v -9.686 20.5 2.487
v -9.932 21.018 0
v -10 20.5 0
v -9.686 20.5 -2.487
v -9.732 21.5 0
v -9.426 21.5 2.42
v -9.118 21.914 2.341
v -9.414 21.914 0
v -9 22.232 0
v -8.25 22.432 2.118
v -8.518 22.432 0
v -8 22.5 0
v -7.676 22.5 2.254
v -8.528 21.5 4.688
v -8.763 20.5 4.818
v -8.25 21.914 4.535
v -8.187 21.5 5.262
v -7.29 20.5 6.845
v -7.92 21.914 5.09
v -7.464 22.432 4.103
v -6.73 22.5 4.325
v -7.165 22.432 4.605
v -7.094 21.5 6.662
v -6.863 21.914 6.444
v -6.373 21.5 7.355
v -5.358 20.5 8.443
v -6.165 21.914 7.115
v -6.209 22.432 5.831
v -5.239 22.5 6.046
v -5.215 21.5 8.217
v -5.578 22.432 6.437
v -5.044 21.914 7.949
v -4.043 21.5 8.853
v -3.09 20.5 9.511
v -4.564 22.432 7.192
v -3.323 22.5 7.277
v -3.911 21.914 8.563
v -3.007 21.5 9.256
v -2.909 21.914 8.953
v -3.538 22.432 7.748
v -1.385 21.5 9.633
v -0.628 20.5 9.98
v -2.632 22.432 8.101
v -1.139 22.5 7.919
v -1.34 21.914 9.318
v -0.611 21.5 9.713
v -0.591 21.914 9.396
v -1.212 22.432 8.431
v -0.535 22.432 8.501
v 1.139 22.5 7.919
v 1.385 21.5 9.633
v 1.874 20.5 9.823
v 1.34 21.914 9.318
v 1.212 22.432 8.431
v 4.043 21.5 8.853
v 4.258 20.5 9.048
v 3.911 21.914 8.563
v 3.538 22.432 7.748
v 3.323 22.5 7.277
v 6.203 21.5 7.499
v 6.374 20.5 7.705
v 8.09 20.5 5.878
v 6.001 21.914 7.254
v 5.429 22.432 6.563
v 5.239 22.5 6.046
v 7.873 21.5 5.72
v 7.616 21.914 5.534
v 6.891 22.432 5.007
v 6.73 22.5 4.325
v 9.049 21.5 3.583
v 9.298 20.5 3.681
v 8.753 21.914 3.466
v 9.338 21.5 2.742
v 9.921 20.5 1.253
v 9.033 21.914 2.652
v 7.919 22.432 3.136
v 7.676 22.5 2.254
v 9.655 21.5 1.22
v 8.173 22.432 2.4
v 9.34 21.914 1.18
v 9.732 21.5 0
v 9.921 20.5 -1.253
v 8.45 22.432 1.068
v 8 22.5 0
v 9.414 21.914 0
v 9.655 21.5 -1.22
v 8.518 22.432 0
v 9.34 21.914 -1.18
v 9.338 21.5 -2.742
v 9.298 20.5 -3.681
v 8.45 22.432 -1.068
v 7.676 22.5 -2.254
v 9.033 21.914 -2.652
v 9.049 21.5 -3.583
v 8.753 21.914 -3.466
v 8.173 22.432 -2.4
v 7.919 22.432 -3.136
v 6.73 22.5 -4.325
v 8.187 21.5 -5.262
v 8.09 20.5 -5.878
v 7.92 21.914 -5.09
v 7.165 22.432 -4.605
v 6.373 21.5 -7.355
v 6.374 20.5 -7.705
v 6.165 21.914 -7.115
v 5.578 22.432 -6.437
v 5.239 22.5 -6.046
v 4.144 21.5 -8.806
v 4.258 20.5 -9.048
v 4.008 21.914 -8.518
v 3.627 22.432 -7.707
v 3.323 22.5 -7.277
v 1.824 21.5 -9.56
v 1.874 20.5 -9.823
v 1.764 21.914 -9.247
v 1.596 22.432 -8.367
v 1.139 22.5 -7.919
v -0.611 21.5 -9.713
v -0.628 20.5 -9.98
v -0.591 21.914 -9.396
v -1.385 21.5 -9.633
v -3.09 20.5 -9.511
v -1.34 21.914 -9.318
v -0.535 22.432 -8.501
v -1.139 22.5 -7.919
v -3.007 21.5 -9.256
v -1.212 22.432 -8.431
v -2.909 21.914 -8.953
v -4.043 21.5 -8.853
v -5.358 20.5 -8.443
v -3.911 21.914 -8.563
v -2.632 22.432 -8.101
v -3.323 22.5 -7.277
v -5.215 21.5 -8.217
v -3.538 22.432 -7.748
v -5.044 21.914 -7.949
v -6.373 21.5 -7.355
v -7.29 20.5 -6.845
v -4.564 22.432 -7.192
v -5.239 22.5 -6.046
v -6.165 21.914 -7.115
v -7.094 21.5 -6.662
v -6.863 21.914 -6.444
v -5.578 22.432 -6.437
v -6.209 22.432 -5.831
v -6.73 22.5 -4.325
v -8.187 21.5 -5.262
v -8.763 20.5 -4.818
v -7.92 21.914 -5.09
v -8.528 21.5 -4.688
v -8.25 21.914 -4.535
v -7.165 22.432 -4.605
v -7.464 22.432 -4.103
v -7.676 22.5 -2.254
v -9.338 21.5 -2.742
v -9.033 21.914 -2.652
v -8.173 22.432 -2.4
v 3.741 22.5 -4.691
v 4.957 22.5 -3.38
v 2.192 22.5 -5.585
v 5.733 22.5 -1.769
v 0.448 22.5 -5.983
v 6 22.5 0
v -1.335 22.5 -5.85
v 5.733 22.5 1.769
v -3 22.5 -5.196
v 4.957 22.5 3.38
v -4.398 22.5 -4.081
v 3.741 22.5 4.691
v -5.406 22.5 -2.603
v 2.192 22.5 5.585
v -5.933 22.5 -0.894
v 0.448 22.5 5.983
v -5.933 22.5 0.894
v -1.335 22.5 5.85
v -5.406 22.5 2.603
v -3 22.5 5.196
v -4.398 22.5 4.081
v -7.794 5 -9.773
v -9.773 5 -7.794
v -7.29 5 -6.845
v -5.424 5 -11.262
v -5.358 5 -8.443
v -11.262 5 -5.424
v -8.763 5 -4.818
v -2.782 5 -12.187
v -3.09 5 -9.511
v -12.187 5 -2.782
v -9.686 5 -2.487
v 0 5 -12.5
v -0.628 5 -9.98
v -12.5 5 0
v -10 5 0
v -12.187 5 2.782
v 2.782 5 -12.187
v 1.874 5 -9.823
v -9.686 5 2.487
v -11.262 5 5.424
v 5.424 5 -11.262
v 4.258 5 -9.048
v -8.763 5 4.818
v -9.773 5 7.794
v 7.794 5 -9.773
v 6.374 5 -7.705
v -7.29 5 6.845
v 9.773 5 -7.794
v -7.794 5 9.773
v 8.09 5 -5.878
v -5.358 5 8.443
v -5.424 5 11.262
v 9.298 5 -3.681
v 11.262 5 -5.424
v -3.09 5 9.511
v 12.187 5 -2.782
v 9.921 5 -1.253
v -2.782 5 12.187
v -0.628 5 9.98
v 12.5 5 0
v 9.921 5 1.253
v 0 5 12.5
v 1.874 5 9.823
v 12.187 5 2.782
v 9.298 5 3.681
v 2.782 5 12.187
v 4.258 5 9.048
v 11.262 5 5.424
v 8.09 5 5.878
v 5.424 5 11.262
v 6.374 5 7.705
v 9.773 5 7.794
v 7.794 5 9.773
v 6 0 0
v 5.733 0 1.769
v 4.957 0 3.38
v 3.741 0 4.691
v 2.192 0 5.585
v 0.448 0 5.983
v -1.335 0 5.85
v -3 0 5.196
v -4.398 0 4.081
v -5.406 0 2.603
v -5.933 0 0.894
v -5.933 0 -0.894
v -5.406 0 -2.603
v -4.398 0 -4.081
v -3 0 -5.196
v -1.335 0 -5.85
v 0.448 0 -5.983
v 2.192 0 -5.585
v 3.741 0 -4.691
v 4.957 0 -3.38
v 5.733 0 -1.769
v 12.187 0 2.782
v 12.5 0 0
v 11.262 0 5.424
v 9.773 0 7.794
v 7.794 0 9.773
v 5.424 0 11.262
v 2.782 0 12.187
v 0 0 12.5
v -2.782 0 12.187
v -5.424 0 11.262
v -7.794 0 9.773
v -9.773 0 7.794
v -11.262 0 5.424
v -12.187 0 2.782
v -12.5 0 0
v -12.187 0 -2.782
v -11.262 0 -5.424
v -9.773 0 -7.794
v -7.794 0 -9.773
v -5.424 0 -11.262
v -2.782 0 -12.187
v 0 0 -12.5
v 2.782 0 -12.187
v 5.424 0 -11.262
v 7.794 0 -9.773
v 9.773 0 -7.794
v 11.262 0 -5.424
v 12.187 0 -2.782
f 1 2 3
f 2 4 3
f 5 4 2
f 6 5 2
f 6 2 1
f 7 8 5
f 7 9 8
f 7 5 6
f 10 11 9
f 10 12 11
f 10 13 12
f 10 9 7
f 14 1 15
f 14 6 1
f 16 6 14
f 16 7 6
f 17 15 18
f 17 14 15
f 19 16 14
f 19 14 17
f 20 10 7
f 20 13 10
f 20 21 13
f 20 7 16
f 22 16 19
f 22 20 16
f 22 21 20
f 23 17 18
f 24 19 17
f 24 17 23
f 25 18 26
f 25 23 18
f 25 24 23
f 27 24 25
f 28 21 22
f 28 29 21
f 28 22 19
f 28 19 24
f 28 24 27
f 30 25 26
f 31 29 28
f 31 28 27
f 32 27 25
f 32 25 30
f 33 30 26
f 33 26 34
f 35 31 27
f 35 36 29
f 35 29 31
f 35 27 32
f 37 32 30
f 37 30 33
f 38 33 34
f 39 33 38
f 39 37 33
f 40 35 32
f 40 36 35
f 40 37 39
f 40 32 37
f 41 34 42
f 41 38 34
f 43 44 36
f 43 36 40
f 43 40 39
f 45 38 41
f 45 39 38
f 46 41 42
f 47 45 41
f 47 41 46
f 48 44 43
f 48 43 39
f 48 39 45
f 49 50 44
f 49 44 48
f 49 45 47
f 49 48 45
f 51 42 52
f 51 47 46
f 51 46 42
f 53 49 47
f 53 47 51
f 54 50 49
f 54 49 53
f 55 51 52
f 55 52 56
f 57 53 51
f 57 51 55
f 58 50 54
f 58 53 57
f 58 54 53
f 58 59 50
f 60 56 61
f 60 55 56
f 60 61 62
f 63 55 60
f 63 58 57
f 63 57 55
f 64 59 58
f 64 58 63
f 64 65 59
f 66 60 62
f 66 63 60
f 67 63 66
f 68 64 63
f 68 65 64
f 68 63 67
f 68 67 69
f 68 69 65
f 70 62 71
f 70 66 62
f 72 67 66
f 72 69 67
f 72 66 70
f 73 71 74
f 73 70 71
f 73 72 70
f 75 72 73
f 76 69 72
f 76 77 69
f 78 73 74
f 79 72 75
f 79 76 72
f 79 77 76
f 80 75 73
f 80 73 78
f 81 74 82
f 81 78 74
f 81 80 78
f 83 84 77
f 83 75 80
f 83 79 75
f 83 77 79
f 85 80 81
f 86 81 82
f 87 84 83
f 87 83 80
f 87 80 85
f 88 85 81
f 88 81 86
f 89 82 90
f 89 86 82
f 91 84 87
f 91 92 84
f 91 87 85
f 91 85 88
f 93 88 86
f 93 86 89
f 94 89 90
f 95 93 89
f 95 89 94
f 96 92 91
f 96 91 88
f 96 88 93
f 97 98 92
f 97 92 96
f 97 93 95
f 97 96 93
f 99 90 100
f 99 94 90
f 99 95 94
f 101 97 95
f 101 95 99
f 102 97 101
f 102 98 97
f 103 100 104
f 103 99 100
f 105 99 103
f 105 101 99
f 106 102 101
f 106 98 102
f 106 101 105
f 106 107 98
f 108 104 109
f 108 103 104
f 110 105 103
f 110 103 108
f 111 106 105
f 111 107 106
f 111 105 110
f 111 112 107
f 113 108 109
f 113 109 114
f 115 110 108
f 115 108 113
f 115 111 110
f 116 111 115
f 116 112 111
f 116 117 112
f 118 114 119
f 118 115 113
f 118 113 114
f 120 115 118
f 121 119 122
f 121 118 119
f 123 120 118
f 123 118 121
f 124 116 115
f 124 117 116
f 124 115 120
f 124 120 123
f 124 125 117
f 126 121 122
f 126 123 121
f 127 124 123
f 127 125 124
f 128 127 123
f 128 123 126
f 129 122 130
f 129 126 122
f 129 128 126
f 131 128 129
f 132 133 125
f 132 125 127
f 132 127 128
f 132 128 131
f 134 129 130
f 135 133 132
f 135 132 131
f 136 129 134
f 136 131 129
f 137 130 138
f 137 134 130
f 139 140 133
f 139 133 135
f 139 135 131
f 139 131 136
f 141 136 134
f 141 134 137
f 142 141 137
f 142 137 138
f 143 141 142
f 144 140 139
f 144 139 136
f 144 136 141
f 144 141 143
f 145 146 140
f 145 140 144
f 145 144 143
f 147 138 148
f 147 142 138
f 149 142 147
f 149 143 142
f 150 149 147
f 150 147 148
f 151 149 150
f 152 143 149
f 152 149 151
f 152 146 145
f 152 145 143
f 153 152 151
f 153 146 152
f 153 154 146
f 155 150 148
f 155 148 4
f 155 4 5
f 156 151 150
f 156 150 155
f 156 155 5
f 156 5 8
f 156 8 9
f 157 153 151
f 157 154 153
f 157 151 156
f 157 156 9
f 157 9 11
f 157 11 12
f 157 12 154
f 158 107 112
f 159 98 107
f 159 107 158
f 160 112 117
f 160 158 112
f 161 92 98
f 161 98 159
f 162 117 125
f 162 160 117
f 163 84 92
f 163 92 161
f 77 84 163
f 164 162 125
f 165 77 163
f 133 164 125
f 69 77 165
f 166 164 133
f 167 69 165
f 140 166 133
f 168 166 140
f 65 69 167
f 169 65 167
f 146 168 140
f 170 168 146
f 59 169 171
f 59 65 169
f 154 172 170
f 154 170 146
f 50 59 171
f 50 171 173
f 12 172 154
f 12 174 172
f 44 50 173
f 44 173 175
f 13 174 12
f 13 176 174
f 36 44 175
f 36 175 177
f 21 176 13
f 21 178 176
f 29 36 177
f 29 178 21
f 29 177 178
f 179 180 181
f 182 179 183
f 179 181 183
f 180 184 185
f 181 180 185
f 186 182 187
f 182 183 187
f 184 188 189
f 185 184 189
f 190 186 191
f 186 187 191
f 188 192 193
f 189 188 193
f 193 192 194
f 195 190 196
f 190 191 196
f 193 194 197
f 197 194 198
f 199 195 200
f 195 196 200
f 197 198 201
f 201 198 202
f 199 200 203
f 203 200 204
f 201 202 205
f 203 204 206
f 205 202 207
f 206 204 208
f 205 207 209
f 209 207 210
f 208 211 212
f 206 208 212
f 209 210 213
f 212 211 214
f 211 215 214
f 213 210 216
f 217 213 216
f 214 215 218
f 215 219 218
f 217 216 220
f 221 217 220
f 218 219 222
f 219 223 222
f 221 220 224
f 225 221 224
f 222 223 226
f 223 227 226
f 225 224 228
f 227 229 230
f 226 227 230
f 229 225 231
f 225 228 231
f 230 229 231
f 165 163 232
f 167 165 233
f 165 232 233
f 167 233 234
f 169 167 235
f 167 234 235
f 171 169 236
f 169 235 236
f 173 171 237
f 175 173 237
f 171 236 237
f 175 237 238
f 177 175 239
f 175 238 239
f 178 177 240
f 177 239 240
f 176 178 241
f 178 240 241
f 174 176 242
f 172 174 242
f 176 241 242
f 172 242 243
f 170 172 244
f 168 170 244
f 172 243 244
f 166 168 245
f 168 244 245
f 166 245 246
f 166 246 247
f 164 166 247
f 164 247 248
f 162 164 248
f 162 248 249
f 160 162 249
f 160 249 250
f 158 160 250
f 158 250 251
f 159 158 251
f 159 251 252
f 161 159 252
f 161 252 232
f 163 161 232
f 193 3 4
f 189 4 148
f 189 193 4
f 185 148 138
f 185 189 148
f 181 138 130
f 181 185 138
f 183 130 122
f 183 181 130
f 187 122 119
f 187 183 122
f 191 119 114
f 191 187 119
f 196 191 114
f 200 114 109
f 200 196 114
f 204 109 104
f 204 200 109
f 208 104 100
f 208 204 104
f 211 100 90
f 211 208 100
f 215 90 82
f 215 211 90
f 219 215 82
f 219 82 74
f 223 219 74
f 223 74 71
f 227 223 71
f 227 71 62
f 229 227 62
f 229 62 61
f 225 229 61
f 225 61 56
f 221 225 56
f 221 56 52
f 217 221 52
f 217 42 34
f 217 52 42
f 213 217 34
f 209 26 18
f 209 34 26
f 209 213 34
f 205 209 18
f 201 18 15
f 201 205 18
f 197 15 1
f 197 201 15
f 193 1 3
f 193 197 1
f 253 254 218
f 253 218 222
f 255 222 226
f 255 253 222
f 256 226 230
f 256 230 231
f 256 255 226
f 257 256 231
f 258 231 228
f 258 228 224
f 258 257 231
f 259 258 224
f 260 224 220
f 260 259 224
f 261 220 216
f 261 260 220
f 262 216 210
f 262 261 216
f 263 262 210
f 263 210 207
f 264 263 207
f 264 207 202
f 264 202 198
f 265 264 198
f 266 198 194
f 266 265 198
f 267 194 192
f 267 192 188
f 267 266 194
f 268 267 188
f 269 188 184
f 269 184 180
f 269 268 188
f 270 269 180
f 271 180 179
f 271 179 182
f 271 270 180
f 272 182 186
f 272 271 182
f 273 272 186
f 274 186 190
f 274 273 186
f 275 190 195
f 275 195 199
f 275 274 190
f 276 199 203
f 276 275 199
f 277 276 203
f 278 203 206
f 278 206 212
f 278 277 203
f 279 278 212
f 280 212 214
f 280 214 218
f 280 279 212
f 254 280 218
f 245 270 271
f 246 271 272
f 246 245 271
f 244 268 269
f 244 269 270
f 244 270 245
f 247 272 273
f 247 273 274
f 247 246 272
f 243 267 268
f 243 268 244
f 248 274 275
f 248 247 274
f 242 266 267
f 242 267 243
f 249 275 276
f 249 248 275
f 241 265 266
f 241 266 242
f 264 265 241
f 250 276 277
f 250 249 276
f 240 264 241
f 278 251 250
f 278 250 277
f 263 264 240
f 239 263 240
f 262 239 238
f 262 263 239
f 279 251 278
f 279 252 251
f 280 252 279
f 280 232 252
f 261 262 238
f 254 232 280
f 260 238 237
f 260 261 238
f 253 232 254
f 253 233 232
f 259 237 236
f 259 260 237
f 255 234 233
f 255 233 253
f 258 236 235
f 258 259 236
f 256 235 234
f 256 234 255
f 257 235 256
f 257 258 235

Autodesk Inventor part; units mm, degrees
ref_plane "YZ Plane" through (0, 0, 0) normal (1, 0, 0) x (0, 1, 0)
ref_plane "XZ Plane" through (0, 0, 0) normal (0, 1, 0) x (-1, 0, 0)
ref_plane "XY Plane" through (0, 0, 0) normal (0, 0, 1) x (1, 0, 0)
sketch "Sketch1" plane through (0, 0, 0) normal (0, 1, 0) x (-1, 0, 0)
  circle A0 centre (0, 0) radius 10
  dimension "d0" = 20
extrude "Extrusion1" add sketch "Sketch1" along normal blind 22.5
sketch "Sketch2" plane through (0, 0, 0) normal (0, -1, 0) x (1, 0, 0)
  circle A0 centre (0, 0) radius 6
  dimension "d3" = 12
extrude "Extrusion2" cut sketch "Sketch2" against normal through all
sketch "Sketch3" plane through (0, 0, 0) normal (0, -1, 0) x (1, 0, 0)
  circle A0 centre (0, 0) radius 10 projected
  circle A1 centre (0, 0) radius 12.5
  dimension "d6" = 25
extrude "Extrusion3" add sketch "Sketch3" against normal blind 5
fillet "Fillet1" radius 2 1 edges at (10, 22.5, 0)
properties part number "Bushing_stempel" material "Brass, Soft Yellow"
